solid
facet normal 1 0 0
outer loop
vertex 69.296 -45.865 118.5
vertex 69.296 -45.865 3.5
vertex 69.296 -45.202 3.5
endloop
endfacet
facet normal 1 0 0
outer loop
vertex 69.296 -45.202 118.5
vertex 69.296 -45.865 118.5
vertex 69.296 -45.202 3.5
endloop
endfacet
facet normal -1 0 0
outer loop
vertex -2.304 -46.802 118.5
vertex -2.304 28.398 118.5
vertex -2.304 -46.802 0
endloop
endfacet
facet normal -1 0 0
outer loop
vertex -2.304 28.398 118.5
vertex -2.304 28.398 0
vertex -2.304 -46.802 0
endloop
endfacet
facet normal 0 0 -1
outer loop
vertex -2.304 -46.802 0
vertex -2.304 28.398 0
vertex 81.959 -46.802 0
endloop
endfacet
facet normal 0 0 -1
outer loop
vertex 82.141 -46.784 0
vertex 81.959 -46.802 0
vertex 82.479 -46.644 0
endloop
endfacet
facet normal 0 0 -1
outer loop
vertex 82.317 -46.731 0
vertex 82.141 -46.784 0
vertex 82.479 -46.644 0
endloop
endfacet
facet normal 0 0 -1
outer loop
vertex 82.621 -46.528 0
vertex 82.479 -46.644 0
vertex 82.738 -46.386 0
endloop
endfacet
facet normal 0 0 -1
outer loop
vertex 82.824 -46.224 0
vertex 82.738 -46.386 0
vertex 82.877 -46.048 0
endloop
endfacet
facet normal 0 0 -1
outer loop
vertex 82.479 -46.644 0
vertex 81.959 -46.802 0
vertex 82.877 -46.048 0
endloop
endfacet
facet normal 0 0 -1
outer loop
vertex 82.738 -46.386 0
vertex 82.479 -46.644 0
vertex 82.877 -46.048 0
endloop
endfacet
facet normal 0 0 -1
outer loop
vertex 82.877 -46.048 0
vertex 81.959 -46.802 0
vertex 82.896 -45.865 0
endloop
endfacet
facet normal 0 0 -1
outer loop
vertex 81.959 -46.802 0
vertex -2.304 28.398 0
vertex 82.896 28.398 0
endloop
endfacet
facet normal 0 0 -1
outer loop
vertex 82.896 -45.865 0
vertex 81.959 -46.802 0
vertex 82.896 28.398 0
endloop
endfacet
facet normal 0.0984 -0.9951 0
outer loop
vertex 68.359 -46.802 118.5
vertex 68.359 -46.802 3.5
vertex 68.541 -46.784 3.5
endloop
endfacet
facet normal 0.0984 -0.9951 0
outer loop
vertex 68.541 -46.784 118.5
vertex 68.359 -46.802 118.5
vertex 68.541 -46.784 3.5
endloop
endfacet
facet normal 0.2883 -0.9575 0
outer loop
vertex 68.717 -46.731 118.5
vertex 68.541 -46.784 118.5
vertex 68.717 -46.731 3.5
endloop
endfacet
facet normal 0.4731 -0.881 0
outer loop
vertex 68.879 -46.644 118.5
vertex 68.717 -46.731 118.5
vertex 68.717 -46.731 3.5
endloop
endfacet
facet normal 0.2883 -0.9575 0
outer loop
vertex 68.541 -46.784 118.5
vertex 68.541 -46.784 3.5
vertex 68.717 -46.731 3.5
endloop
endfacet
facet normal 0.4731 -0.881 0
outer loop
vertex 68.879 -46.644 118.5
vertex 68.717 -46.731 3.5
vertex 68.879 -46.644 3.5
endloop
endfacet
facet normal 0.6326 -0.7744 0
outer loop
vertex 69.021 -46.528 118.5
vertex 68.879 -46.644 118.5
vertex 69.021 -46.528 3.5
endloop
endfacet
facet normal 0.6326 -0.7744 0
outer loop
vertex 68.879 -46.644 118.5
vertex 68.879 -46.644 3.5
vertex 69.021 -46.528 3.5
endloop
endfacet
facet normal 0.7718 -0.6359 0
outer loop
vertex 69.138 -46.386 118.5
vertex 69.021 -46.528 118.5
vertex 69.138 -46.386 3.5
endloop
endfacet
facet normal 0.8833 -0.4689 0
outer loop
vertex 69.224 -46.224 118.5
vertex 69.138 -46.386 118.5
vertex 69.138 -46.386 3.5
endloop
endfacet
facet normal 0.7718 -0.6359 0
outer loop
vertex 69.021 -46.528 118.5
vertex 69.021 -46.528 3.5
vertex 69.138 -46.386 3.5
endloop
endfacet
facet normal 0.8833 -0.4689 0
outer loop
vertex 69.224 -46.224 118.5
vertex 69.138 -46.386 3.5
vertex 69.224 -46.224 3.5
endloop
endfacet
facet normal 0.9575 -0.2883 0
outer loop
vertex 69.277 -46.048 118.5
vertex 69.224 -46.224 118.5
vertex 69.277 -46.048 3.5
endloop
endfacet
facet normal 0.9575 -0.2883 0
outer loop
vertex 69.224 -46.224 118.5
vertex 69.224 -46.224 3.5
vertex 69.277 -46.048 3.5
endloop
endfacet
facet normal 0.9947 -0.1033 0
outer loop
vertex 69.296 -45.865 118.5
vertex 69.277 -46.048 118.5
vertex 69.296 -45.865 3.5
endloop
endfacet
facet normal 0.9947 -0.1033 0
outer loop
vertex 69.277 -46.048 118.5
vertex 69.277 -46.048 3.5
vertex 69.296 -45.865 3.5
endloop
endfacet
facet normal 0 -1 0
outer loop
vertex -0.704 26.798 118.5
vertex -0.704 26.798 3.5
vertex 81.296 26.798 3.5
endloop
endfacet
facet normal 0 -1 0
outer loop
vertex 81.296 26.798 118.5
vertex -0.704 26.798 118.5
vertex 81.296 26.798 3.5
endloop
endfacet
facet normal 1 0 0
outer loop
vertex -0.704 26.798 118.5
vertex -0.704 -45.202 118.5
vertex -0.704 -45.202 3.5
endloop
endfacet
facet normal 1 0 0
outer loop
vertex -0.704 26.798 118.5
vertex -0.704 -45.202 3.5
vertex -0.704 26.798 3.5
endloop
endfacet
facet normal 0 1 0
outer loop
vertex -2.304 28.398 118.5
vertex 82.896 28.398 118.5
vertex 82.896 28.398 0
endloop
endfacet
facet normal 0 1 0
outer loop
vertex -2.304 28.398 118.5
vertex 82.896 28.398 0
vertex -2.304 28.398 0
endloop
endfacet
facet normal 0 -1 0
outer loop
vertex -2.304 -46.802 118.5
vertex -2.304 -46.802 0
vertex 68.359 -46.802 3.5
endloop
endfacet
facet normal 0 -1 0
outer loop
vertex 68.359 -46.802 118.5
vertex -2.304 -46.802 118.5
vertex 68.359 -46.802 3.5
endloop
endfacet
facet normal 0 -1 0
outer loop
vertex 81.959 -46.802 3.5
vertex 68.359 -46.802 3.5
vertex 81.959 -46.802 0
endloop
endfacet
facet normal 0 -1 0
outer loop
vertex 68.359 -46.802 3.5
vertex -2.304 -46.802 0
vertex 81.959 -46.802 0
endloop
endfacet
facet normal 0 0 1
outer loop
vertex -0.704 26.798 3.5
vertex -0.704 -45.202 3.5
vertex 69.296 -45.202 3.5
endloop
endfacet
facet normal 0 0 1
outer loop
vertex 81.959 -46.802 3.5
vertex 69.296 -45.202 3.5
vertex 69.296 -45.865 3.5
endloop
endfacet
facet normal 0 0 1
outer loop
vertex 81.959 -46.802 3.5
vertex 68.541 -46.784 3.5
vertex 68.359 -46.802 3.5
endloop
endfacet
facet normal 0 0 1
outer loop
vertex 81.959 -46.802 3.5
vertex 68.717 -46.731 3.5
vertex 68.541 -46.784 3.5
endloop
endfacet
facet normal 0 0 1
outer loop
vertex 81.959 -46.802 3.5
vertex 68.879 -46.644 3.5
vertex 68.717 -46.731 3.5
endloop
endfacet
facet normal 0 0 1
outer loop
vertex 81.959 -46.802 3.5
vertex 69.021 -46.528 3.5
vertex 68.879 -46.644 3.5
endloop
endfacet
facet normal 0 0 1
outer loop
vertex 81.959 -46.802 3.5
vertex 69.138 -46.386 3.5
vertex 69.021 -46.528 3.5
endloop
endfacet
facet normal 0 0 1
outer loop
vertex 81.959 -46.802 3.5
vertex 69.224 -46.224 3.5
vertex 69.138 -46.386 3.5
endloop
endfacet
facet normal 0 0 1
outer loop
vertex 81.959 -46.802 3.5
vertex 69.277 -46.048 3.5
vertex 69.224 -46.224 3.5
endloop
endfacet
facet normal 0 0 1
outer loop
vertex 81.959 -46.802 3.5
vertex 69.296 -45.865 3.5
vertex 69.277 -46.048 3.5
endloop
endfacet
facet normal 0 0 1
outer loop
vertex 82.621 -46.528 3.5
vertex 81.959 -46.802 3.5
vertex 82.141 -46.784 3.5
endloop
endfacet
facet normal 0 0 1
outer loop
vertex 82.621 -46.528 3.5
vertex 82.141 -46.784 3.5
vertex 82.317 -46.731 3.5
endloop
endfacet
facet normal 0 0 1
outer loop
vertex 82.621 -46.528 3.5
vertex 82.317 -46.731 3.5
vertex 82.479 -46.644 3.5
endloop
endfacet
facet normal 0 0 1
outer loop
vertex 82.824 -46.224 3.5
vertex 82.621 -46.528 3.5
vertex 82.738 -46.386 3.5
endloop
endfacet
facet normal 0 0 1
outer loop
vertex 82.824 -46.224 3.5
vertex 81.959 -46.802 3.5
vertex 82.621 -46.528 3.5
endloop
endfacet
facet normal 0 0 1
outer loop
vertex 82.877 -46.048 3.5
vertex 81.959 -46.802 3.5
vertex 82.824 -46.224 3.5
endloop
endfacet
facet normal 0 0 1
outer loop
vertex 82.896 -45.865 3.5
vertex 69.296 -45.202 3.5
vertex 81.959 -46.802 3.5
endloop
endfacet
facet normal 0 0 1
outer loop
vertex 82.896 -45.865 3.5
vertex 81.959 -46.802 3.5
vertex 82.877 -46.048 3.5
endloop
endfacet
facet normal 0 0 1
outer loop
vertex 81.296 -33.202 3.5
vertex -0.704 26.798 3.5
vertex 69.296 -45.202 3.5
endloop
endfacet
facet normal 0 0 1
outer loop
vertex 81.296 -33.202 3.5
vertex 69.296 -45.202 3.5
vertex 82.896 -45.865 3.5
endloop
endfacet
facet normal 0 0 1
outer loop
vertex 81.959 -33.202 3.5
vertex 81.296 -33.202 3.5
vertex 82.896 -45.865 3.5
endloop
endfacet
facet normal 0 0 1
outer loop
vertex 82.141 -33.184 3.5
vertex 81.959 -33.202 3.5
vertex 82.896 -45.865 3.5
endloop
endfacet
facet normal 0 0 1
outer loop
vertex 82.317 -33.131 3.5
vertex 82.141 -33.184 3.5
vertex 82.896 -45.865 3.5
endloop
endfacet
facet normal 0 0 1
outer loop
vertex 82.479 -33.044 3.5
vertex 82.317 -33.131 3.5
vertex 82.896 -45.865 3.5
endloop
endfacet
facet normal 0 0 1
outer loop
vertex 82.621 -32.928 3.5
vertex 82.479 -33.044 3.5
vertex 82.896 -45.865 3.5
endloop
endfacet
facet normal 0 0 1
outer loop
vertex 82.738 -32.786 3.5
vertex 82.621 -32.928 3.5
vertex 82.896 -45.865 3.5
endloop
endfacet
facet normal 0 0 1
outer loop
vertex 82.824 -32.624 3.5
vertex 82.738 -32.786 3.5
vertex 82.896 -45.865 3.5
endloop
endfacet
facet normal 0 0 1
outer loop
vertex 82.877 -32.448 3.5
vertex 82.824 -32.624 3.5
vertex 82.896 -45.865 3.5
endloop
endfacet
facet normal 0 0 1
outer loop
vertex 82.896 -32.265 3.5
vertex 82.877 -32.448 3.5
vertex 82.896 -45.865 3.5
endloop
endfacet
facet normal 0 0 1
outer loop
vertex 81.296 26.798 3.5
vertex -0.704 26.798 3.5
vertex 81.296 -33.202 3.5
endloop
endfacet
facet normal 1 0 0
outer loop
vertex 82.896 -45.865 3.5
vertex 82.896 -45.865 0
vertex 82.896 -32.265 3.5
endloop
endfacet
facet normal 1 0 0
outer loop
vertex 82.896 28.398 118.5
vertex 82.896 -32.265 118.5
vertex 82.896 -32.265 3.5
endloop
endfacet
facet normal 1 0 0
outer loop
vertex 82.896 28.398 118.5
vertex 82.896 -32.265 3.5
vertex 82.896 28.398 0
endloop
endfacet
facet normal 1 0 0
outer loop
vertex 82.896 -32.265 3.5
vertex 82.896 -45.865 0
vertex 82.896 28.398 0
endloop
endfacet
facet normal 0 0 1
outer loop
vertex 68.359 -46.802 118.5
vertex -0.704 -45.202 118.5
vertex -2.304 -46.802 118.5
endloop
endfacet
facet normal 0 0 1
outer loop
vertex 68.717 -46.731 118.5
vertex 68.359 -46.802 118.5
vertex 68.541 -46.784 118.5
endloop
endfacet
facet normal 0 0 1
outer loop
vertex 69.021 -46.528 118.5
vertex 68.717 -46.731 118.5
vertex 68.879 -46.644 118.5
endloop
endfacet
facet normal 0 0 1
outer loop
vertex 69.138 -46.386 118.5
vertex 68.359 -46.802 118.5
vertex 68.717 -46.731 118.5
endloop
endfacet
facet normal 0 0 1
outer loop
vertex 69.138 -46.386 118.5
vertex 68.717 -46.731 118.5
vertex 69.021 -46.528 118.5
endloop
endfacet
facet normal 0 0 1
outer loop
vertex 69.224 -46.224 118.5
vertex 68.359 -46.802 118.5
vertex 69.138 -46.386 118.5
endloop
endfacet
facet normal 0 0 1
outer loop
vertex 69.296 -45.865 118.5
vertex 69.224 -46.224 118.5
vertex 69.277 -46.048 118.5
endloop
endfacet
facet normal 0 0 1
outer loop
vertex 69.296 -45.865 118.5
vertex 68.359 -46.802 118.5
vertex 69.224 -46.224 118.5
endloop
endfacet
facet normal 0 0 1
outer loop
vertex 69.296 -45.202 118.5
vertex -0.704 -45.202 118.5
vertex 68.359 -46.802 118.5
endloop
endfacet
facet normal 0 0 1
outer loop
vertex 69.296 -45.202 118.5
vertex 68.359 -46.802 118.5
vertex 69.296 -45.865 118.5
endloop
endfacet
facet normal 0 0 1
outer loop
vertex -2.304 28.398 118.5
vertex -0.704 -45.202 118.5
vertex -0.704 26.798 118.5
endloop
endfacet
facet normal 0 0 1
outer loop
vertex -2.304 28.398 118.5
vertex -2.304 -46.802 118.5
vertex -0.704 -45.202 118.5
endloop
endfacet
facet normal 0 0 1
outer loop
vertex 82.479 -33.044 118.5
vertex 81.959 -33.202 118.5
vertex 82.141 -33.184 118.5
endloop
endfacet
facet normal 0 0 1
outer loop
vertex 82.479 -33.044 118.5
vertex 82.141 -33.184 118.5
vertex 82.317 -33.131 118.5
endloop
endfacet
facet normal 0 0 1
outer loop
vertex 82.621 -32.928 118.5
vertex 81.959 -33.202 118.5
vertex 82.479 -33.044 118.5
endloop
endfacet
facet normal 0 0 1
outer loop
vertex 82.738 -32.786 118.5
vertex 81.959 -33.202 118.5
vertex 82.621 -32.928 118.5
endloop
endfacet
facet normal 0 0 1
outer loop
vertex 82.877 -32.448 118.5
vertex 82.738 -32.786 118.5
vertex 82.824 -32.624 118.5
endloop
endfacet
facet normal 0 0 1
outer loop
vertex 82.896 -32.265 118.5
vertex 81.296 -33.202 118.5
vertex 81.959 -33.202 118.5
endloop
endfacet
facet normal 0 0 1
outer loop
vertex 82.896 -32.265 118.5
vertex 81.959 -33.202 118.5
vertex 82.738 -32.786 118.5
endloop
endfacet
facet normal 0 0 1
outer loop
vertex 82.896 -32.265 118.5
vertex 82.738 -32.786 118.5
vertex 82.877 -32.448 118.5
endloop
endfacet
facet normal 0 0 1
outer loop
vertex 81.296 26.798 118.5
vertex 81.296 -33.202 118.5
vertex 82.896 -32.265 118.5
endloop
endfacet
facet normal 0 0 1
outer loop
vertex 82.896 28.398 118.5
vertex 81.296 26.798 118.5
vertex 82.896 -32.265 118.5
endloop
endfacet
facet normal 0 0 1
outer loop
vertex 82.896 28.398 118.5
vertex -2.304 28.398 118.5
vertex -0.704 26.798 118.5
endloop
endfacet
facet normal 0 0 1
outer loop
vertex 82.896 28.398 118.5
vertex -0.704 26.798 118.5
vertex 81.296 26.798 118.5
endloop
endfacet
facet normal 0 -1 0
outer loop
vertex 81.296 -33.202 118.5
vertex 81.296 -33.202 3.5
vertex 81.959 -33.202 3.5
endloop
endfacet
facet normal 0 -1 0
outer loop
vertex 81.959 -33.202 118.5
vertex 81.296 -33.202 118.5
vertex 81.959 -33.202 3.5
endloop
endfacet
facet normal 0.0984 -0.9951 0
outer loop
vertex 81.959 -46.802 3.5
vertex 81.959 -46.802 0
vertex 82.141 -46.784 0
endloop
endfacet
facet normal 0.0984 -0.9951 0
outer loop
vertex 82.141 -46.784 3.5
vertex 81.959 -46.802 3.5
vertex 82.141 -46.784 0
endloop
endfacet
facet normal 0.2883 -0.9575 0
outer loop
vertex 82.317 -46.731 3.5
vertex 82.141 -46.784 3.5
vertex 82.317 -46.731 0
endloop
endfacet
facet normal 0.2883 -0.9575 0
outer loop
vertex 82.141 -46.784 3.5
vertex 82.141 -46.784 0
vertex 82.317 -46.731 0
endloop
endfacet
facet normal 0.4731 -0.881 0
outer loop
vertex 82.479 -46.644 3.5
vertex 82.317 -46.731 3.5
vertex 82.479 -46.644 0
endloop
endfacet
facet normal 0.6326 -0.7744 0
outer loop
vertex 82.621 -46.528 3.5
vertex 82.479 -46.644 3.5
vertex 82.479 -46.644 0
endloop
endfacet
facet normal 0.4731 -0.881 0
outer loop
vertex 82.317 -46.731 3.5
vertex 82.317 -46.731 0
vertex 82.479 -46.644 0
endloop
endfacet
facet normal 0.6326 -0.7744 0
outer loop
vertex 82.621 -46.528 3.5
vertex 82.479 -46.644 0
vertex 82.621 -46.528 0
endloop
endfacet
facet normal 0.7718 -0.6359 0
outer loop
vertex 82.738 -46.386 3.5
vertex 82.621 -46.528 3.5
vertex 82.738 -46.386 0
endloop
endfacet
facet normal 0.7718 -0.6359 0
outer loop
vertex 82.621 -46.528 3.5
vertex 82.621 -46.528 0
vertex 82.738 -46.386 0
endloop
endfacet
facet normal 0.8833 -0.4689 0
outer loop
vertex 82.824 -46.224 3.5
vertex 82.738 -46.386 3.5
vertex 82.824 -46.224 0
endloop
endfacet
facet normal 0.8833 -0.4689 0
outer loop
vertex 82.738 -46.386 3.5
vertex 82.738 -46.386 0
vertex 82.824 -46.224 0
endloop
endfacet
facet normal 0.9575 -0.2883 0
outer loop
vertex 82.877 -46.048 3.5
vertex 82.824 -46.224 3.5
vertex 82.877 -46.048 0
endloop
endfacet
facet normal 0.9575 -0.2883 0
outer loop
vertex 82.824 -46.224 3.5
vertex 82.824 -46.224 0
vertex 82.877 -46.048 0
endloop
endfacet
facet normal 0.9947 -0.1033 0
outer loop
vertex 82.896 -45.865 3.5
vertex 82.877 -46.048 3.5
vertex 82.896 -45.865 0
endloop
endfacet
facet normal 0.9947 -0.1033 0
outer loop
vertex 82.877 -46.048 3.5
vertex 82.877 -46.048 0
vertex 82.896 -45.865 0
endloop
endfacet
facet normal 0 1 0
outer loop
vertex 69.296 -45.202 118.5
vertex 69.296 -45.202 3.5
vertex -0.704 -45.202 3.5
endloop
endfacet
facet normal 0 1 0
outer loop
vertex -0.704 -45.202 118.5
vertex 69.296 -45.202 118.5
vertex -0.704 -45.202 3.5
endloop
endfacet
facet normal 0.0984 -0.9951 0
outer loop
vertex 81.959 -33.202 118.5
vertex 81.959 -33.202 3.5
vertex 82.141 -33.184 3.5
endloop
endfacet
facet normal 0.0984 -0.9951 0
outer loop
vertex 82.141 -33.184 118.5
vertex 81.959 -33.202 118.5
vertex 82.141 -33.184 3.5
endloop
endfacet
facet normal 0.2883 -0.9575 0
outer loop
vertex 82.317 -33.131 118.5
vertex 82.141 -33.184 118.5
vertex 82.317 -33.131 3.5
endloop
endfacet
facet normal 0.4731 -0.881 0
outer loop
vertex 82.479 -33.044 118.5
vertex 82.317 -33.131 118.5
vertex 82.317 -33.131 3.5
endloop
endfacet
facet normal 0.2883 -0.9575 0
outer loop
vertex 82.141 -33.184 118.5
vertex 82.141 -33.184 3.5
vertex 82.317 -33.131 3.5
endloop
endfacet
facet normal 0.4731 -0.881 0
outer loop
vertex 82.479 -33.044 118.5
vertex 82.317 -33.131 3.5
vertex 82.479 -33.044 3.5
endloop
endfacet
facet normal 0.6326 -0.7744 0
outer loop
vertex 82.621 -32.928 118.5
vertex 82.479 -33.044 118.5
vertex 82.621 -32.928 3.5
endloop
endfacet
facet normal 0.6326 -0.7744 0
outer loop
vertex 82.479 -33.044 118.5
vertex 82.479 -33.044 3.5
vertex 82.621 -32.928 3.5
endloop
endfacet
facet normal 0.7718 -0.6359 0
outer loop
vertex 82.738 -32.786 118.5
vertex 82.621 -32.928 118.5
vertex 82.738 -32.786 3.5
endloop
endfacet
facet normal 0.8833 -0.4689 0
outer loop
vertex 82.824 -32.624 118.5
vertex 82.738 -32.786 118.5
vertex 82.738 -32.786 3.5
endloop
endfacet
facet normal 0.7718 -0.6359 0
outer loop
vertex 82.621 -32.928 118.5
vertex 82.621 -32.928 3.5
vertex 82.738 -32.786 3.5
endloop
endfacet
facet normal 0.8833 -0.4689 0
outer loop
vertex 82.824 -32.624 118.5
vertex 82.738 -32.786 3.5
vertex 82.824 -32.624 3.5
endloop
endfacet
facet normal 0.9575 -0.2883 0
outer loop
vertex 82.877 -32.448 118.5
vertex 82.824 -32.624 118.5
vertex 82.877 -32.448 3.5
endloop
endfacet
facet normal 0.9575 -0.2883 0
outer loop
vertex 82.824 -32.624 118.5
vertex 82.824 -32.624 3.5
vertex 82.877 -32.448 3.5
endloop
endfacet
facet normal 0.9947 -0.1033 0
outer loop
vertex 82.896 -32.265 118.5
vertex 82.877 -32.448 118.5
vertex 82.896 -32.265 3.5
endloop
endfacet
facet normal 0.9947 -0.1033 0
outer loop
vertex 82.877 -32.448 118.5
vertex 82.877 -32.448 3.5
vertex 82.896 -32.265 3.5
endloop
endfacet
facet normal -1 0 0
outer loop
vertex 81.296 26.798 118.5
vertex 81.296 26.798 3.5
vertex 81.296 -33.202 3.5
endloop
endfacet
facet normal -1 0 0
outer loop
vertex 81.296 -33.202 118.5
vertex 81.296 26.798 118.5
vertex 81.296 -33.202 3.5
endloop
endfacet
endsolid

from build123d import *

# Parameters (mm, degrees)
F1_DEPTH = 3.5
F3_DEPTH = 115


with BuildPart() as f1:
    # F0 (on Top) → F1 (new body)
    with BuildSketch(Plane.XY):
        with BuildLine():
            Line((82.8955, 28.39768), (-2.3045, 28.39768))
            Line((-2.3045, 28.39768), (-2.3045, -46.80232))
            Line((-2.3045, -46.80232), (81.958594, -46.80232))
            ThreePointArc((81.958594, -46.80232), (82.621087, -46.527906), (82.8955, -45.865413))
            Line((82.8955, -45.865413), (82.8955, 28.39768))
        make_face()
    extrude(amount=F1_DEPTH)

    # F2 (on face) → F3 (join)
    with BuildSketch(Plane.XY.offset(3.5)):
        with BuildLine():
            Line((69.2955, -45.865413), (69.2955, -45.20232))
            Line((69.2955, -45.20232), (-0.7045, -45.20232))
            Line((-0.7045, -45.20232), (-0.7045, 26.79768))
            Line((-0.7045, 26.79768), (81.2955, 26.79768))
            Line((81.2955, 26.79768), (81.2955, -33.20232))
            Line((81.2955, -33.20232), (81.958594, -33.20232))
            ThreePointArc((81.958594, -33.20232), (82.621087, -32.927906), (82.8955, -32.265413))
            Line((82.8955, -32.265413), (82.8955, 28.39768))
            Line((82.8955, 28.39768), (-2.3045, 28.39768))
            Line((-2.3045, 28.39768), (-2.3045, -46.80232))
            Line((-2.3045, -46.80232), (68.358594, -46.80232))
            ThreePointArc((68.358594, -46.80232), (69.021087, -46.527906), (69.2955, -45.865413))
        make_face()
    extrude(amount=F3_DEPTH)


solid = f1.part
